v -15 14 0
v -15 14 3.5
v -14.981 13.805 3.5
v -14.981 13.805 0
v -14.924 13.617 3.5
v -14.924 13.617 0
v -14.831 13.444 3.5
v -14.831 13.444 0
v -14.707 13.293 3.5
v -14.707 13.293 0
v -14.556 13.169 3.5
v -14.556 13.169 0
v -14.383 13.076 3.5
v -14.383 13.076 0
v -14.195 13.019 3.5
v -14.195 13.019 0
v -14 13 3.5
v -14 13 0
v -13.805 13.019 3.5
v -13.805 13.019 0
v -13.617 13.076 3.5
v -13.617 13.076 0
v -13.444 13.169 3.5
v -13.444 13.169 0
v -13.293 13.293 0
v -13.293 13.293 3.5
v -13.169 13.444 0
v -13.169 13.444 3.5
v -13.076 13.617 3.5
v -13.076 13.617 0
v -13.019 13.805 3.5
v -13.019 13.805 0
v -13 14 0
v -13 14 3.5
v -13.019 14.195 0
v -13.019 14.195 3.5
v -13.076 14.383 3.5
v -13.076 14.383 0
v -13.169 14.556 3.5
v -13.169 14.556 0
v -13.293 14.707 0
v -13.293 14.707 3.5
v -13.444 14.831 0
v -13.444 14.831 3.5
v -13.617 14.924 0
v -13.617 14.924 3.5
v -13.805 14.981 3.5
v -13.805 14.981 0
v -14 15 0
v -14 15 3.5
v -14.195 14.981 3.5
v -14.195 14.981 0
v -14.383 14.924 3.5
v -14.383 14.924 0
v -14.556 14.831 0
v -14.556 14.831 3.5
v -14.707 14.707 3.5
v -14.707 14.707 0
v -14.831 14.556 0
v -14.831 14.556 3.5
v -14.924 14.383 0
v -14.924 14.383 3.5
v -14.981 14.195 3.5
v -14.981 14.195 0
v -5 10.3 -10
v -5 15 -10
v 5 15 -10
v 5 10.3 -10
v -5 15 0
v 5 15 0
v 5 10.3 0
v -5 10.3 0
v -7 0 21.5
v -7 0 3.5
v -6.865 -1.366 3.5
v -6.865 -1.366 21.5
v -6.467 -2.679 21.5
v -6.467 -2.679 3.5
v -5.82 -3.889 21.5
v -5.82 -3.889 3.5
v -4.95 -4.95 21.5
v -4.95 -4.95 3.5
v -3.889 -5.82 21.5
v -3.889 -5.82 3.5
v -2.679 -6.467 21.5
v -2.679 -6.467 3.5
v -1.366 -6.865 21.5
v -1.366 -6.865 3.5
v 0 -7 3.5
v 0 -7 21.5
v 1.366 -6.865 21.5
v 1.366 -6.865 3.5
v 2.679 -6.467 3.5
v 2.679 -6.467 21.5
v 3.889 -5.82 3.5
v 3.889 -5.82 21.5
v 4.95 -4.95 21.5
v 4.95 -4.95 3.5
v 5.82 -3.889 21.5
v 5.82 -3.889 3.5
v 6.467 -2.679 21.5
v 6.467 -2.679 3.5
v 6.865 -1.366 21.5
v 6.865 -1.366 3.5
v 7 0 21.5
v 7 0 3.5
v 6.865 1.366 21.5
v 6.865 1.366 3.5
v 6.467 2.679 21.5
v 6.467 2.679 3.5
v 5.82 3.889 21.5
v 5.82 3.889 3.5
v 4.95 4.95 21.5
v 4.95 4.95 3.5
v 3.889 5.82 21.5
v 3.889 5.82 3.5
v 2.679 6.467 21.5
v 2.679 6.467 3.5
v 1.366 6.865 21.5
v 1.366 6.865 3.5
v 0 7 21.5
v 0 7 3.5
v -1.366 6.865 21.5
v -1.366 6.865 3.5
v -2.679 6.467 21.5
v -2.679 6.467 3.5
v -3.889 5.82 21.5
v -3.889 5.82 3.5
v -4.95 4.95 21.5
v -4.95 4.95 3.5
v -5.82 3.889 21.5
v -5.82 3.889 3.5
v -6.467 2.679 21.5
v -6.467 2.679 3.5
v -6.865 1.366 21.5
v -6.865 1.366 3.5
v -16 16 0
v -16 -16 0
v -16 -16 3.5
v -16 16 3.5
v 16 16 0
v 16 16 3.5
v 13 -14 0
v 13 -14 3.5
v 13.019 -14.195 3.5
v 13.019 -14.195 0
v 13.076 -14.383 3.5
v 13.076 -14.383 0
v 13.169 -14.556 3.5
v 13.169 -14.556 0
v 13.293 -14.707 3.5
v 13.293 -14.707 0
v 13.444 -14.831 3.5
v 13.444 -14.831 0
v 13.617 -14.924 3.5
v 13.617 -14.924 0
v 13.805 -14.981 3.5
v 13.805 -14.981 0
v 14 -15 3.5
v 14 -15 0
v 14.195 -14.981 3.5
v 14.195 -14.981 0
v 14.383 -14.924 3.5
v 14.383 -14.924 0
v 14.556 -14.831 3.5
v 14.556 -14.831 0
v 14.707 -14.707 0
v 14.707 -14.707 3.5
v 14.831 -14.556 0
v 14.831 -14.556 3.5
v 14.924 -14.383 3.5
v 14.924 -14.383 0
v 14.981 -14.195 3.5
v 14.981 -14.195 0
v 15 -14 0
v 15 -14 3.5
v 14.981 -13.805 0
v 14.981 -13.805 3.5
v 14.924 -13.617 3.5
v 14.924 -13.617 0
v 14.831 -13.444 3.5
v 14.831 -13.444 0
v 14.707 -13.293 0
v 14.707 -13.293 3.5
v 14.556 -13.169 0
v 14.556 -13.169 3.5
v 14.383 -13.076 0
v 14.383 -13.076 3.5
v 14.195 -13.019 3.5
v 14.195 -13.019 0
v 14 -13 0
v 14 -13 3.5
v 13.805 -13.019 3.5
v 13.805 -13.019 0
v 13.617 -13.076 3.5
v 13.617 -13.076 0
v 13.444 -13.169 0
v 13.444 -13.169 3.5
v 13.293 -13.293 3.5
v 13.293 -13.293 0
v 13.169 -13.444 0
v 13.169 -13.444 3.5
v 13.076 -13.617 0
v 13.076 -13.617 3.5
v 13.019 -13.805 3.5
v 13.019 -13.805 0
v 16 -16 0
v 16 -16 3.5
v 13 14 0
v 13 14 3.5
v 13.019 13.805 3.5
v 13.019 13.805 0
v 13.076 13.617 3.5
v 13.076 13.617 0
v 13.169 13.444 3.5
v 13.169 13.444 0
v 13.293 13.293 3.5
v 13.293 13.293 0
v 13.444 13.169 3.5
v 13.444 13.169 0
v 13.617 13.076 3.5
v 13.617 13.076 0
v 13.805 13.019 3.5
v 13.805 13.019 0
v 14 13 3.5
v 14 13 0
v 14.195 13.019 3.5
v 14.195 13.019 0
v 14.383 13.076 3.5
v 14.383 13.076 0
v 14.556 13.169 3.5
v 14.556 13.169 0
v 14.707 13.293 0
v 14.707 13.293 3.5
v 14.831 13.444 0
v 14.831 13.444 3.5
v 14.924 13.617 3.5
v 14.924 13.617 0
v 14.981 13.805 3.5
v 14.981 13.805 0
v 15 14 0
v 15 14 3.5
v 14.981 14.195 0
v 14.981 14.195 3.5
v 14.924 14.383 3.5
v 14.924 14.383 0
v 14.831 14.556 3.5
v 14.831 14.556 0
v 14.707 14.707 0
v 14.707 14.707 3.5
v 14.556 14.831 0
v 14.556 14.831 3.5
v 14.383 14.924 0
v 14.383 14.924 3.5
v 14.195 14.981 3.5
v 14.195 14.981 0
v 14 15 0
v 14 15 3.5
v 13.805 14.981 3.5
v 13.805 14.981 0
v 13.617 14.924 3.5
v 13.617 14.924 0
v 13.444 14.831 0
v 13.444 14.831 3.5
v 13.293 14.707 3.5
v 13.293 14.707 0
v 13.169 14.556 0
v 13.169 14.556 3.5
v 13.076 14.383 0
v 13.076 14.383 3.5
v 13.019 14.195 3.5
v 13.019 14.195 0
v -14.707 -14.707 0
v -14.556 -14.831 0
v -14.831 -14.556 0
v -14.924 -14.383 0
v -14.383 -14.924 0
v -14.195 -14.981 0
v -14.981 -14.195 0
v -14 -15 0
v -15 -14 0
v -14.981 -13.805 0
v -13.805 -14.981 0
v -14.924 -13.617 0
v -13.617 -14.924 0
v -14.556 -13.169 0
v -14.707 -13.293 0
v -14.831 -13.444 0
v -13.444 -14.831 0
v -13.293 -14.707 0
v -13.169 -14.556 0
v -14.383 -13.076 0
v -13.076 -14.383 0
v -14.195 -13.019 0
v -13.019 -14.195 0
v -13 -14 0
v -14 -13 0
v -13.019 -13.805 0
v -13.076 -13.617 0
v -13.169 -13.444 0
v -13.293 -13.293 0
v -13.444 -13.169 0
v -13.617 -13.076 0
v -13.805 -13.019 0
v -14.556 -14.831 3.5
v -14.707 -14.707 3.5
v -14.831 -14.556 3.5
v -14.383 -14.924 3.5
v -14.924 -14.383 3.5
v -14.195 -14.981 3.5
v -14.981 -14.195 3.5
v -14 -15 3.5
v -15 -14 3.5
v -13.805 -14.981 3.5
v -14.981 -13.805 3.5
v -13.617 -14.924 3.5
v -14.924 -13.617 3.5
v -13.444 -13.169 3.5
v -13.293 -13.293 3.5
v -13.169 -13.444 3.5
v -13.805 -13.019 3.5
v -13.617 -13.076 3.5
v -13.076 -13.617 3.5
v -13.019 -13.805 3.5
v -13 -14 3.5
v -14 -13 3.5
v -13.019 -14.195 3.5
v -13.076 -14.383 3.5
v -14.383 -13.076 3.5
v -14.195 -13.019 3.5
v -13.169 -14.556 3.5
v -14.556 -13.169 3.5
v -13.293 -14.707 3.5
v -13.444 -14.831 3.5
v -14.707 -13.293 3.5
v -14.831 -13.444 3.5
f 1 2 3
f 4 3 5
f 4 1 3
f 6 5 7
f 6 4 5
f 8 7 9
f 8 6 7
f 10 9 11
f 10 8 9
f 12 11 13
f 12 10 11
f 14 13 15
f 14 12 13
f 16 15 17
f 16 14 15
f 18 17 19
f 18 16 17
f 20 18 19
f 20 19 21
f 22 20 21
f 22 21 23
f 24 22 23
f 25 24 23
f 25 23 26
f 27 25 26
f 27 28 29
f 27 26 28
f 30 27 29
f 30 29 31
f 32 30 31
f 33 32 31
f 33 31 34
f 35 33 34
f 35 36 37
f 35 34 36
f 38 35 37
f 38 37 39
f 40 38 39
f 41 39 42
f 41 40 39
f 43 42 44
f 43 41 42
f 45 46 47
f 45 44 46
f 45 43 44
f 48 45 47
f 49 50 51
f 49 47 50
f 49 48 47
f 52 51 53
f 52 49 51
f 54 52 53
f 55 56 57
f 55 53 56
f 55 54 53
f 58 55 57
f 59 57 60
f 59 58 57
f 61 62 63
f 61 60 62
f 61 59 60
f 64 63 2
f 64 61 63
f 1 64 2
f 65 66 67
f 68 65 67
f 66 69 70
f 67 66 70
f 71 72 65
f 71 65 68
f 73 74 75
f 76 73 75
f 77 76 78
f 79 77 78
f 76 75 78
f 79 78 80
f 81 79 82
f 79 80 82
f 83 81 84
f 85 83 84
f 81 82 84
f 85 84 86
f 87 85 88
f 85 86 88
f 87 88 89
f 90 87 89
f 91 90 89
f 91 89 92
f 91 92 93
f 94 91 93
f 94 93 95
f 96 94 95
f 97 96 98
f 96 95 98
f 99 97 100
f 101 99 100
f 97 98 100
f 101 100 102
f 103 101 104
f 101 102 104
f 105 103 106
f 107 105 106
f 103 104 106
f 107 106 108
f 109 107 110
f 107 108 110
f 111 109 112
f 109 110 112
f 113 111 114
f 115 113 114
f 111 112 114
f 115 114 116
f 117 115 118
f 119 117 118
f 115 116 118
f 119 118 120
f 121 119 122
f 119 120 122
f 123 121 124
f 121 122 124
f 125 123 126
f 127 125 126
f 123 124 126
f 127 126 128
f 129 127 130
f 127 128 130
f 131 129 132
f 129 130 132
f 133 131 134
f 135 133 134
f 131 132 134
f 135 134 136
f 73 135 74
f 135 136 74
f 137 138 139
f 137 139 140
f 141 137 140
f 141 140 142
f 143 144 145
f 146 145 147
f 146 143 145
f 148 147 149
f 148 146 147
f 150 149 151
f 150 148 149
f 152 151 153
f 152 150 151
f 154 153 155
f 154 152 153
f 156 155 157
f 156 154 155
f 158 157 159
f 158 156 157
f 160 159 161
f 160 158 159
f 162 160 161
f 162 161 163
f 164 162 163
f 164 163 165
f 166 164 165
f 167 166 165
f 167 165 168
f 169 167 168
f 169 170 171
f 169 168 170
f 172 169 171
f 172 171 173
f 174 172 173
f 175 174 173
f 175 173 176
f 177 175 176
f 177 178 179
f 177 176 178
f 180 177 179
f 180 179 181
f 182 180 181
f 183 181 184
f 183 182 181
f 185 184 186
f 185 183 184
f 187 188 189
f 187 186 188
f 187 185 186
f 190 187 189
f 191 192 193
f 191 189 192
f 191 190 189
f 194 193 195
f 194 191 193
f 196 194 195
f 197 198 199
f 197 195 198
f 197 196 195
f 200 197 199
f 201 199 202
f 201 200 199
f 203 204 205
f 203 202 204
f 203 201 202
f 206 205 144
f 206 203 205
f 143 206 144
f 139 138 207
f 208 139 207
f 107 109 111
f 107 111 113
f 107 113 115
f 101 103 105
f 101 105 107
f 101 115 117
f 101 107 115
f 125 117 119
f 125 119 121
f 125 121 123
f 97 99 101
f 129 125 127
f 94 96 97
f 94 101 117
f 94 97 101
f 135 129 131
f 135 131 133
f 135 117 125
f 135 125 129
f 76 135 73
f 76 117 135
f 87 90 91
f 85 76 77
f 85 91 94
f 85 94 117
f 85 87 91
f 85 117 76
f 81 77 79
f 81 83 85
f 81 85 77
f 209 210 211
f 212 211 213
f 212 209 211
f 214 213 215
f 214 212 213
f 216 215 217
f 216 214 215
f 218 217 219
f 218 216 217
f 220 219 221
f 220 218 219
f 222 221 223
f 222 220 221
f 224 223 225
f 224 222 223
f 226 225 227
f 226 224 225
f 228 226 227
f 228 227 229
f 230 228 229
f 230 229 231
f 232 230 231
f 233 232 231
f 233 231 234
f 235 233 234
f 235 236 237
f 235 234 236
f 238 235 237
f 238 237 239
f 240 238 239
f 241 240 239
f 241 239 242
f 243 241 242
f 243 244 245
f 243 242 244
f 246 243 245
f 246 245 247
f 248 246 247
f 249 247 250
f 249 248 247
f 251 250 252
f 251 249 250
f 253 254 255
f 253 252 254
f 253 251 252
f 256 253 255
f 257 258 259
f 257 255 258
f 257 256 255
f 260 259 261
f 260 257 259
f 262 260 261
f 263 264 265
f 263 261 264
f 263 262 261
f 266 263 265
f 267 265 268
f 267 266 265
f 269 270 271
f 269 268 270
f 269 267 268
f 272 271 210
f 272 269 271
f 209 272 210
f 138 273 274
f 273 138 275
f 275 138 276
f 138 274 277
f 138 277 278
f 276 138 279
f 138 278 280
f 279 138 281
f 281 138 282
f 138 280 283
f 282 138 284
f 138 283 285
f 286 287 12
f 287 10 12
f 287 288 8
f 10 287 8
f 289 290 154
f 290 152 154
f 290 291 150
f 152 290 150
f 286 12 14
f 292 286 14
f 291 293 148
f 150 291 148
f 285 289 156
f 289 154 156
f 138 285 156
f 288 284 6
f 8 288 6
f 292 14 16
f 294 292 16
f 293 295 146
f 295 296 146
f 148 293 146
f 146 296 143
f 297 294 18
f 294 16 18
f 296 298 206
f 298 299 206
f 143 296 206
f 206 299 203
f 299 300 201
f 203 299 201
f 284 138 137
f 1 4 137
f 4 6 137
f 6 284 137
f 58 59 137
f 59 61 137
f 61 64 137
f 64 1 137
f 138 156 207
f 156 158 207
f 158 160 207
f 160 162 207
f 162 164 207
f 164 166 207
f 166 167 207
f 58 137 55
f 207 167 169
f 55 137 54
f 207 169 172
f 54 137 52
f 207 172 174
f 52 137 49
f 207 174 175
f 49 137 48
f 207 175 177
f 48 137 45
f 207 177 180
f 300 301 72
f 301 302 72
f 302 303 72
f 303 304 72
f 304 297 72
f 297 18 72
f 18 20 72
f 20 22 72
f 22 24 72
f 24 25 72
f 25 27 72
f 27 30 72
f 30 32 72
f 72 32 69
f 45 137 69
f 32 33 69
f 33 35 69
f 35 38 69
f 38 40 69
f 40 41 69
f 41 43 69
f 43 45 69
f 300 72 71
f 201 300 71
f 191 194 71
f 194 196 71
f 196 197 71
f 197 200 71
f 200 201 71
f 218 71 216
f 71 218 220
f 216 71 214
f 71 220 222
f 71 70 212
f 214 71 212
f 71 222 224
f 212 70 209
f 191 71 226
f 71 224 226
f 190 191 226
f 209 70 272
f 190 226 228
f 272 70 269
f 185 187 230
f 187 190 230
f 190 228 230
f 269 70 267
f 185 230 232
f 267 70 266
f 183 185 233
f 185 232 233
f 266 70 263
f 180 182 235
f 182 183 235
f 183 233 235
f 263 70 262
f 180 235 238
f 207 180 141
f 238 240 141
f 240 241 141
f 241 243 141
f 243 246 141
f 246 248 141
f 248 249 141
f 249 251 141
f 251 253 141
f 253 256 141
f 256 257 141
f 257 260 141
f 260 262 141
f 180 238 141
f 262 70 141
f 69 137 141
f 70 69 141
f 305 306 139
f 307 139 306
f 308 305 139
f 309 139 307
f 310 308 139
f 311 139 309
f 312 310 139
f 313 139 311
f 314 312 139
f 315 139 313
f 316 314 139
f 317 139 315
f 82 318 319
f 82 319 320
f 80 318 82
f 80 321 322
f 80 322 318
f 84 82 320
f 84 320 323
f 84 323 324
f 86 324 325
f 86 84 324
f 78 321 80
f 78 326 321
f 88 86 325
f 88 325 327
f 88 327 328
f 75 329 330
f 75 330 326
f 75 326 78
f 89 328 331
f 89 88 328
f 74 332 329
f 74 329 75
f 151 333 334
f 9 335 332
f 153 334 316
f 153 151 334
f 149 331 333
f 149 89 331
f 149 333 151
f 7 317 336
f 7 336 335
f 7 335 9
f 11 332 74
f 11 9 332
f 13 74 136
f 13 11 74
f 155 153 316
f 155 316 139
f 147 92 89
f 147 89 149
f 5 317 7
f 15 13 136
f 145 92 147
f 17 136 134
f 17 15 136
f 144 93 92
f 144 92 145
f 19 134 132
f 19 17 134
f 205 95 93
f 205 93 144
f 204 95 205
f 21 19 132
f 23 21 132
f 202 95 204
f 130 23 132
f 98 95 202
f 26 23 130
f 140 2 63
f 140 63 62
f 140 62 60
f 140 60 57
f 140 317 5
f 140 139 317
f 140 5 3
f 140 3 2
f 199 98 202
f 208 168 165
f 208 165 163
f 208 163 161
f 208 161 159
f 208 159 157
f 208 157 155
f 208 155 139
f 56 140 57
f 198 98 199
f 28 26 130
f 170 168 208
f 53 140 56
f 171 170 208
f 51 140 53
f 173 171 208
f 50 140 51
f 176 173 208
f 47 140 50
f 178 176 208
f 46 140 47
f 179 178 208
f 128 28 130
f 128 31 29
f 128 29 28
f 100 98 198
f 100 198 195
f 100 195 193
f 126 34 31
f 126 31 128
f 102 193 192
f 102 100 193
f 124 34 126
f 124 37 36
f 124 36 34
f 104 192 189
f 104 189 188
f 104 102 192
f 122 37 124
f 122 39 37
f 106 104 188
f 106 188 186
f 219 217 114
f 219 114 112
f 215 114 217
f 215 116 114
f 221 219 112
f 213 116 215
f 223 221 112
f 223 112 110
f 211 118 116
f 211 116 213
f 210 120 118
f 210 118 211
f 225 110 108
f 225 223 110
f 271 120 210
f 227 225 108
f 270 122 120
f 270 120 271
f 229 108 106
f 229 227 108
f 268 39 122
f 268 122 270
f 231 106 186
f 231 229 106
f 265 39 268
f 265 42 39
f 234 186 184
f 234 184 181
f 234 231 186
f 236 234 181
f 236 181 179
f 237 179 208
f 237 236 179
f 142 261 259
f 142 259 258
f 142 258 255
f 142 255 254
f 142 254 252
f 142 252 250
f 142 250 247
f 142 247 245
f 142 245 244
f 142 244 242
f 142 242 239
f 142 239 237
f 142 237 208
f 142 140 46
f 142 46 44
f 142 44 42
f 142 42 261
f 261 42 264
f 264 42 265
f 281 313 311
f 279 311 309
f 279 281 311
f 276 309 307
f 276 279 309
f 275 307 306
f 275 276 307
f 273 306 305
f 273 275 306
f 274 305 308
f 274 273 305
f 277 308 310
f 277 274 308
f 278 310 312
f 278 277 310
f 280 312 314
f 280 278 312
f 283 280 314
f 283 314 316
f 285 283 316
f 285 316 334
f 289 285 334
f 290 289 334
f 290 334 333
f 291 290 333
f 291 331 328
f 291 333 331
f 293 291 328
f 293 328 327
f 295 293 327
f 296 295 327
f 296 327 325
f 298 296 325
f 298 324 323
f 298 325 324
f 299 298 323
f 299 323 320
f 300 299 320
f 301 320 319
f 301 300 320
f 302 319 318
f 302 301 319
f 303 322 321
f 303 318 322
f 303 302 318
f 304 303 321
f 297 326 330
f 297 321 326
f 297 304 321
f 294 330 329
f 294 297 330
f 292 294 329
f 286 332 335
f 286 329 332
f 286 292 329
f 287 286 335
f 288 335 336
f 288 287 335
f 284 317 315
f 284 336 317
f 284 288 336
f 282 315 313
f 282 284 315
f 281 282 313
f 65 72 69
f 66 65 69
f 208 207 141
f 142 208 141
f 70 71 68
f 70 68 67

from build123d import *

# Parameters (mm, degrees)
SKETCH1_W           = 32
SKETCH1_H           = 32
BOSS_EXTRUDE1_DEPTH = 3.5
BOSS_EXTRUDE2_START = 3.5
SKETCH2_R           = 7
BOSS_EXTRUDE2_DEPTH = 18
SKETCH3_W           = 10
SKETCH3_H           = 4.7
BOSS_EXTRUDE3_DEPTH = 10
SKETCH4_R           = 1
CUT_EXTRUDE1_DEPTH  = 10


with BuildPart() as part:
    # Sketch1 → Boss-Extrude1 (new body)
    with BuildSketch(Plane.XY):
        Rectangle(SKETCH1_W, SKETCH1_H)
    extrude(amount=BOSS_EXTRUDE1_DEPTH)

    # Sketch2 → Boss-Extrude2 (add)
    with BuildSketch(Plane.XY.offset(BOSS_EXTRUDE2_START)):
        with Locations(Location((0, 0, 0), (0, 0, 180))):
            Circle(SKETCH2_R)
    extrude(amount=BOSS_EXTRUDE2_DEPTH)

    # Sketch3 → Boss-Extrude3 (add)
    with BuildSketch(Plane.XY):
        with Locations((0, 12.65)):
            Rectangle(SKETCH3_W, SKETCH3_H)
    extrude(amount=-BOSS_EXTRUDE3_DEPTH)

    # Sketch4 → Cut-Extrude1 (cut)
    with BuildSketch(Plane.XY):
        with Locations(Location((14, 14, 0), (0, 0, 180))):
            Circle(SKETCH4_R)
        with Locations(Location((-14, 14, 0), (0, 0, 180))):
            Circle(SKETCH4_R)
        with Locations(Location((-14, -14, 0), (0, 0, 180))):
            Circle(SKETCH4_R)
        with Locations(Location((14, -14, 0), (0, 0, 180))):
            Circle(SKETCH4_R)
    extrude(amount=CUT_EXTRUDE1_DEPTH, mode=Mode.SUBTRACT)


solid = part.part
